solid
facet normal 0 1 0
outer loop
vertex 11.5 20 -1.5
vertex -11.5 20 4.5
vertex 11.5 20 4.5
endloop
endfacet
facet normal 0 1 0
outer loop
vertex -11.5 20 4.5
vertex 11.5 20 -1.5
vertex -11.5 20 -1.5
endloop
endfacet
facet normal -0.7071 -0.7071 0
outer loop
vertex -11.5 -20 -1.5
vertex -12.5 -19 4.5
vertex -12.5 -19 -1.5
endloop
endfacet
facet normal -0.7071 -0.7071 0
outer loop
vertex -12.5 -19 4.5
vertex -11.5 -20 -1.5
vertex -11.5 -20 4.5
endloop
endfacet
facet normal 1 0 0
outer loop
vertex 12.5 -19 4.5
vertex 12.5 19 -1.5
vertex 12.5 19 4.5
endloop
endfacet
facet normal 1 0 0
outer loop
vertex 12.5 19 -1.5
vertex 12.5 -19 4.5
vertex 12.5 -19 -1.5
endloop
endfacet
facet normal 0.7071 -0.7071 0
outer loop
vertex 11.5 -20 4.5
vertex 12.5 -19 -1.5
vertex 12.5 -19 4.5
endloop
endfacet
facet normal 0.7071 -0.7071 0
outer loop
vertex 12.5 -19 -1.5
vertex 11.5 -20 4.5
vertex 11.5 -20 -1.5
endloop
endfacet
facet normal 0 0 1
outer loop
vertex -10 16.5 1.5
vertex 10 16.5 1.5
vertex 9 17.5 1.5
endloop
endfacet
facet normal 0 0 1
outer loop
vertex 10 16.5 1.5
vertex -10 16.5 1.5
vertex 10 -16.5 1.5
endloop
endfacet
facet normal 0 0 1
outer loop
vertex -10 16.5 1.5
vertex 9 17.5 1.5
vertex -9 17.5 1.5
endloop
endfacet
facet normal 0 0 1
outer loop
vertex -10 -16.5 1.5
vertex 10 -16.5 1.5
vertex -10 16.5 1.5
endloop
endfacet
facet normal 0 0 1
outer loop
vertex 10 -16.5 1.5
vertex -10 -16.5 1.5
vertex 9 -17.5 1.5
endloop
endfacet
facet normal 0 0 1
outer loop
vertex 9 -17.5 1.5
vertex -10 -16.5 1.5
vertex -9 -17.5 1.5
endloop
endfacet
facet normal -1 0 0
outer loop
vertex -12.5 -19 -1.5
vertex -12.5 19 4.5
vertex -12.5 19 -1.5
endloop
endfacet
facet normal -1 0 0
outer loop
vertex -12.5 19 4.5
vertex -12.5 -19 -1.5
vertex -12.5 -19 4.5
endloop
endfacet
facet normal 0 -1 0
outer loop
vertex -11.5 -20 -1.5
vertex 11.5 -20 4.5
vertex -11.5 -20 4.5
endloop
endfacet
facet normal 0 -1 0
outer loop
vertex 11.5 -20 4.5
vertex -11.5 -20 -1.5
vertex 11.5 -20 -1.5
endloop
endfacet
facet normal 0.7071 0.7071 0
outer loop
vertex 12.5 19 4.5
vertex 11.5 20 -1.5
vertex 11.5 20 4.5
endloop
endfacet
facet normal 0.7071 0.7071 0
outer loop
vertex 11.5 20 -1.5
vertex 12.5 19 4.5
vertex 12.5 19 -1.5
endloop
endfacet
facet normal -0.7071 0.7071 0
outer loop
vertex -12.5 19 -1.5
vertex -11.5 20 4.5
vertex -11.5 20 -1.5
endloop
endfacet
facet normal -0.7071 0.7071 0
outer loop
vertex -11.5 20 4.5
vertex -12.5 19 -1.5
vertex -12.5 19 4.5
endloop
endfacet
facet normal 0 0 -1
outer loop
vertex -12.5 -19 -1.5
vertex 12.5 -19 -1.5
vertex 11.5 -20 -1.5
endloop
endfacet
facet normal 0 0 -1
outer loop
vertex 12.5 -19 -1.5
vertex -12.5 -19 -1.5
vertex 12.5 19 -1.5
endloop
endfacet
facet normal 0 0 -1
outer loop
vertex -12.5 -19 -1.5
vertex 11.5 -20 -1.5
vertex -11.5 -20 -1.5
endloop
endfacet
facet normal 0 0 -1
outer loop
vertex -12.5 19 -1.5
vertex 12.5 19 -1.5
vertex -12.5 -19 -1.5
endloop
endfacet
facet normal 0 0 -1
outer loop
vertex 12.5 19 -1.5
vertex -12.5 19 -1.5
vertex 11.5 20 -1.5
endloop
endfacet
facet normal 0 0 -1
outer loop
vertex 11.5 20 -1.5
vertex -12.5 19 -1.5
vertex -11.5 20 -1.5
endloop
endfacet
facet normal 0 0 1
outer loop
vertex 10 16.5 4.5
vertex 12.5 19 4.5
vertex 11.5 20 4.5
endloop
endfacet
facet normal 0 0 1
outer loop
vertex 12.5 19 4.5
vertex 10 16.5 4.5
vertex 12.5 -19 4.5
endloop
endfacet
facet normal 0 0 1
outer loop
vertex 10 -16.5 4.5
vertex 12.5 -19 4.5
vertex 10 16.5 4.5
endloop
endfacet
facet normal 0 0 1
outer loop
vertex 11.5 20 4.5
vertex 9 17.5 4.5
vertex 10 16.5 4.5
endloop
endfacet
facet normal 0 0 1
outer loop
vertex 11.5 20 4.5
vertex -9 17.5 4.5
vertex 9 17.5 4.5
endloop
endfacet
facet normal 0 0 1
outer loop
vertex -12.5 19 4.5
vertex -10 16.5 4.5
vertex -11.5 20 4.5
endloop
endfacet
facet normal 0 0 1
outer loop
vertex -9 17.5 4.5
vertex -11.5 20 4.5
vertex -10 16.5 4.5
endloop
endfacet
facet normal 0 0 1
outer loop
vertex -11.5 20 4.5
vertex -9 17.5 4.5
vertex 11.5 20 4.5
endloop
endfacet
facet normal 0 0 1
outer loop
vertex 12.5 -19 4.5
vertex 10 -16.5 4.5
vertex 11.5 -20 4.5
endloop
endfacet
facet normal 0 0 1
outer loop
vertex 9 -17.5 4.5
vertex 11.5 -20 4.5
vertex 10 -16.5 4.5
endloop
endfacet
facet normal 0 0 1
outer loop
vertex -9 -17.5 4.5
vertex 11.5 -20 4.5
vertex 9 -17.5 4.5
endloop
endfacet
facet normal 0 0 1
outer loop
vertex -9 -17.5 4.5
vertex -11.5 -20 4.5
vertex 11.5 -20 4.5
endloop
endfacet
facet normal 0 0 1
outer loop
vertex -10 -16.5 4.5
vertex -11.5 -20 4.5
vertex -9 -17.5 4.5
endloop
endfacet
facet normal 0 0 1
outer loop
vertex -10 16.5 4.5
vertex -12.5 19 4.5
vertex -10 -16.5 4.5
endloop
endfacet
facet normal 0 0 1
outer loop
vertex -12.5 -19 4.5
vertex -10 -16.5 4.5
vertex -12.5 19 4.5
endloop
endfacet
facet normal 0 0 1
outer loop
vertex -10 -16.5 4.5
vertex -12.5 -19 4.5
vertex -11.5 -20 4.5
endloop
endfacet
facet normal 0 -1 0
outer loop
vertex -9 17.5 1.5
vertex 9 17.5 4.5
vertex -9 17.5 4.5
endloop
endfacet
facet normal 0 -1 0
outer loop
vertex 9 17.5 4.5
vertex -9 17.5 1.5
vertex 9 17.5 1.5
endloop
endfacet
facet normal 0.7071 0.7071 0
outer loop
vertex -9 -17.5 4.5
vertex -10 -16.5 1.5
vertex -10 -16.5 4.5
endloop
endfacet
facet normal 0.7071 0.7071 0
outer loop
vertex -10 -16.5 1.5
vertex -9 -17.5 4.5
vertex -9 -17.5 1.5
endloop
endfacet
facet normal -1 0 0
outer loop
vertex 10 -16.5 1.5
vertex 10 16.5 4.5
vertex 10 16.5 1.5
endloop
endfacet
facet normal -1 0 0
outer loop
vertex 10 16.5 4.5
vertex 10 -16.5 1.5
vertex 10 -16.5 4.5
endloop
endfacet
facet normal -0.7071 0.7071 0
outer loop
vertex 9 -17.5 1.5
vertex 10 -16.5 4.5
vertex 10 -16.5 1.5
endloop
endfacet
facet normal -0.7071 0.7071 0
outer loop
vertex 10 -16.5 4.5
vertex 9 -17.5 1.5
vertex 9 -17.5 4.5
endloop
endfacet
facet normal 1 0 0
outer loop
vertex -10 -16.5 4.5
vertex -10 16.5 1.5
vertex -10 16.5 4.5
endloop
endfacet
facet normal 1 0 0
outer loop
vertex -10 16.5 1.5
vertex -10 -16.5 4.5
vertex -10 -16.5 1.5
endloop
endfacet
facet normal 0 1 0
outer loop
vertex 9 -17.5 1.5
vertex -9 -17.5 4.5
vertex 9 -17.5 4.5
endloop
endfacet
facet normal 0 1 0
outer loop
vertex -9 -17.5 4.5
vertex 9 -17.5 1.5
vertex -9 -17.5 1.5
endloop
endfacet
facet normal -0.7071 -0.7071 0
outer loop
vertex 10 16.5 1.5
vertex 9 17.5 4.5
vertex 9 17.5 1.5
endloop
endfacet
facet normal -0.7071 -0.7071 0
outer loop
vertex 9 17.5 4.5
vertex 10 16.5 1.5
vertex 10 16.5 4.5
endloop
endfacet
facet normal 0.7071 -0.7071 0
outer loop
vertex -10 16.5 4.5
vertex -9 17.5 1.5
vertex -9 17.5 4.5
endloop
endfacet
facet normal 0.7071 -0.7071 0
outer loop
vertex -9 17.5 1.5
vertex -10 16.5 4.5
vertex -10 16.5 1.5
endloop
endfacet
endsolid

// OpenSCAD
/*
 * Tao Steps Stamp
 */
 echo(version=version());

logo = "steps.tao.black.small.png";
logoy = 400; 
logox = 607; 

module roundedRect(size, radius) {  
	linear_extrude(height=size.z, center=true) {
		offset(radius) offset(-radius) {
			square([size.x, size.y], center = true);
		}
	}
}


// Base plate
// ----------
plateWidth = 25;
plateLength = 40;
plateThickNess = 3;
cornerRadius = 1;
imgStep = 31.5;
//color("green") {
difference() {  
	union() {
		difference() {
			roundedRect([plateWidth, plateLength, plateThickNess], cornerRadius);
			translate([0, 0, 2]) {
				scale([.6 * (plateLength / 1) / logox, 
               .6 * plateWidth / logoy, .02]) {
					color("white") {
						rotate([0, 0, -0]) {
							surface(file=logo, invert=true, center=true);
						}
					}
				}
        // the groove around the picture
        //difference() {
        //  roundedRect([plateWidth -  5, plateLength -  5, plateThickNess], cornerRadius);
        //  roundedRect([plateWidth - 10, plateLength - 10, plateThickNess * 1.1], cornerRadius);
        //}
			}
		}
		// The frame
		translate([0, 0, (plateThickNess / 1)]) {
			difference() {
				roundedRect([plateWidth, plateLength, plateThickNess], cornerRadius);
				roundedRect([plateWidth - 5, plateLength - 5, plateThickNess * 1.1], cornerRadius);
			}
		}
	}
}
//}
